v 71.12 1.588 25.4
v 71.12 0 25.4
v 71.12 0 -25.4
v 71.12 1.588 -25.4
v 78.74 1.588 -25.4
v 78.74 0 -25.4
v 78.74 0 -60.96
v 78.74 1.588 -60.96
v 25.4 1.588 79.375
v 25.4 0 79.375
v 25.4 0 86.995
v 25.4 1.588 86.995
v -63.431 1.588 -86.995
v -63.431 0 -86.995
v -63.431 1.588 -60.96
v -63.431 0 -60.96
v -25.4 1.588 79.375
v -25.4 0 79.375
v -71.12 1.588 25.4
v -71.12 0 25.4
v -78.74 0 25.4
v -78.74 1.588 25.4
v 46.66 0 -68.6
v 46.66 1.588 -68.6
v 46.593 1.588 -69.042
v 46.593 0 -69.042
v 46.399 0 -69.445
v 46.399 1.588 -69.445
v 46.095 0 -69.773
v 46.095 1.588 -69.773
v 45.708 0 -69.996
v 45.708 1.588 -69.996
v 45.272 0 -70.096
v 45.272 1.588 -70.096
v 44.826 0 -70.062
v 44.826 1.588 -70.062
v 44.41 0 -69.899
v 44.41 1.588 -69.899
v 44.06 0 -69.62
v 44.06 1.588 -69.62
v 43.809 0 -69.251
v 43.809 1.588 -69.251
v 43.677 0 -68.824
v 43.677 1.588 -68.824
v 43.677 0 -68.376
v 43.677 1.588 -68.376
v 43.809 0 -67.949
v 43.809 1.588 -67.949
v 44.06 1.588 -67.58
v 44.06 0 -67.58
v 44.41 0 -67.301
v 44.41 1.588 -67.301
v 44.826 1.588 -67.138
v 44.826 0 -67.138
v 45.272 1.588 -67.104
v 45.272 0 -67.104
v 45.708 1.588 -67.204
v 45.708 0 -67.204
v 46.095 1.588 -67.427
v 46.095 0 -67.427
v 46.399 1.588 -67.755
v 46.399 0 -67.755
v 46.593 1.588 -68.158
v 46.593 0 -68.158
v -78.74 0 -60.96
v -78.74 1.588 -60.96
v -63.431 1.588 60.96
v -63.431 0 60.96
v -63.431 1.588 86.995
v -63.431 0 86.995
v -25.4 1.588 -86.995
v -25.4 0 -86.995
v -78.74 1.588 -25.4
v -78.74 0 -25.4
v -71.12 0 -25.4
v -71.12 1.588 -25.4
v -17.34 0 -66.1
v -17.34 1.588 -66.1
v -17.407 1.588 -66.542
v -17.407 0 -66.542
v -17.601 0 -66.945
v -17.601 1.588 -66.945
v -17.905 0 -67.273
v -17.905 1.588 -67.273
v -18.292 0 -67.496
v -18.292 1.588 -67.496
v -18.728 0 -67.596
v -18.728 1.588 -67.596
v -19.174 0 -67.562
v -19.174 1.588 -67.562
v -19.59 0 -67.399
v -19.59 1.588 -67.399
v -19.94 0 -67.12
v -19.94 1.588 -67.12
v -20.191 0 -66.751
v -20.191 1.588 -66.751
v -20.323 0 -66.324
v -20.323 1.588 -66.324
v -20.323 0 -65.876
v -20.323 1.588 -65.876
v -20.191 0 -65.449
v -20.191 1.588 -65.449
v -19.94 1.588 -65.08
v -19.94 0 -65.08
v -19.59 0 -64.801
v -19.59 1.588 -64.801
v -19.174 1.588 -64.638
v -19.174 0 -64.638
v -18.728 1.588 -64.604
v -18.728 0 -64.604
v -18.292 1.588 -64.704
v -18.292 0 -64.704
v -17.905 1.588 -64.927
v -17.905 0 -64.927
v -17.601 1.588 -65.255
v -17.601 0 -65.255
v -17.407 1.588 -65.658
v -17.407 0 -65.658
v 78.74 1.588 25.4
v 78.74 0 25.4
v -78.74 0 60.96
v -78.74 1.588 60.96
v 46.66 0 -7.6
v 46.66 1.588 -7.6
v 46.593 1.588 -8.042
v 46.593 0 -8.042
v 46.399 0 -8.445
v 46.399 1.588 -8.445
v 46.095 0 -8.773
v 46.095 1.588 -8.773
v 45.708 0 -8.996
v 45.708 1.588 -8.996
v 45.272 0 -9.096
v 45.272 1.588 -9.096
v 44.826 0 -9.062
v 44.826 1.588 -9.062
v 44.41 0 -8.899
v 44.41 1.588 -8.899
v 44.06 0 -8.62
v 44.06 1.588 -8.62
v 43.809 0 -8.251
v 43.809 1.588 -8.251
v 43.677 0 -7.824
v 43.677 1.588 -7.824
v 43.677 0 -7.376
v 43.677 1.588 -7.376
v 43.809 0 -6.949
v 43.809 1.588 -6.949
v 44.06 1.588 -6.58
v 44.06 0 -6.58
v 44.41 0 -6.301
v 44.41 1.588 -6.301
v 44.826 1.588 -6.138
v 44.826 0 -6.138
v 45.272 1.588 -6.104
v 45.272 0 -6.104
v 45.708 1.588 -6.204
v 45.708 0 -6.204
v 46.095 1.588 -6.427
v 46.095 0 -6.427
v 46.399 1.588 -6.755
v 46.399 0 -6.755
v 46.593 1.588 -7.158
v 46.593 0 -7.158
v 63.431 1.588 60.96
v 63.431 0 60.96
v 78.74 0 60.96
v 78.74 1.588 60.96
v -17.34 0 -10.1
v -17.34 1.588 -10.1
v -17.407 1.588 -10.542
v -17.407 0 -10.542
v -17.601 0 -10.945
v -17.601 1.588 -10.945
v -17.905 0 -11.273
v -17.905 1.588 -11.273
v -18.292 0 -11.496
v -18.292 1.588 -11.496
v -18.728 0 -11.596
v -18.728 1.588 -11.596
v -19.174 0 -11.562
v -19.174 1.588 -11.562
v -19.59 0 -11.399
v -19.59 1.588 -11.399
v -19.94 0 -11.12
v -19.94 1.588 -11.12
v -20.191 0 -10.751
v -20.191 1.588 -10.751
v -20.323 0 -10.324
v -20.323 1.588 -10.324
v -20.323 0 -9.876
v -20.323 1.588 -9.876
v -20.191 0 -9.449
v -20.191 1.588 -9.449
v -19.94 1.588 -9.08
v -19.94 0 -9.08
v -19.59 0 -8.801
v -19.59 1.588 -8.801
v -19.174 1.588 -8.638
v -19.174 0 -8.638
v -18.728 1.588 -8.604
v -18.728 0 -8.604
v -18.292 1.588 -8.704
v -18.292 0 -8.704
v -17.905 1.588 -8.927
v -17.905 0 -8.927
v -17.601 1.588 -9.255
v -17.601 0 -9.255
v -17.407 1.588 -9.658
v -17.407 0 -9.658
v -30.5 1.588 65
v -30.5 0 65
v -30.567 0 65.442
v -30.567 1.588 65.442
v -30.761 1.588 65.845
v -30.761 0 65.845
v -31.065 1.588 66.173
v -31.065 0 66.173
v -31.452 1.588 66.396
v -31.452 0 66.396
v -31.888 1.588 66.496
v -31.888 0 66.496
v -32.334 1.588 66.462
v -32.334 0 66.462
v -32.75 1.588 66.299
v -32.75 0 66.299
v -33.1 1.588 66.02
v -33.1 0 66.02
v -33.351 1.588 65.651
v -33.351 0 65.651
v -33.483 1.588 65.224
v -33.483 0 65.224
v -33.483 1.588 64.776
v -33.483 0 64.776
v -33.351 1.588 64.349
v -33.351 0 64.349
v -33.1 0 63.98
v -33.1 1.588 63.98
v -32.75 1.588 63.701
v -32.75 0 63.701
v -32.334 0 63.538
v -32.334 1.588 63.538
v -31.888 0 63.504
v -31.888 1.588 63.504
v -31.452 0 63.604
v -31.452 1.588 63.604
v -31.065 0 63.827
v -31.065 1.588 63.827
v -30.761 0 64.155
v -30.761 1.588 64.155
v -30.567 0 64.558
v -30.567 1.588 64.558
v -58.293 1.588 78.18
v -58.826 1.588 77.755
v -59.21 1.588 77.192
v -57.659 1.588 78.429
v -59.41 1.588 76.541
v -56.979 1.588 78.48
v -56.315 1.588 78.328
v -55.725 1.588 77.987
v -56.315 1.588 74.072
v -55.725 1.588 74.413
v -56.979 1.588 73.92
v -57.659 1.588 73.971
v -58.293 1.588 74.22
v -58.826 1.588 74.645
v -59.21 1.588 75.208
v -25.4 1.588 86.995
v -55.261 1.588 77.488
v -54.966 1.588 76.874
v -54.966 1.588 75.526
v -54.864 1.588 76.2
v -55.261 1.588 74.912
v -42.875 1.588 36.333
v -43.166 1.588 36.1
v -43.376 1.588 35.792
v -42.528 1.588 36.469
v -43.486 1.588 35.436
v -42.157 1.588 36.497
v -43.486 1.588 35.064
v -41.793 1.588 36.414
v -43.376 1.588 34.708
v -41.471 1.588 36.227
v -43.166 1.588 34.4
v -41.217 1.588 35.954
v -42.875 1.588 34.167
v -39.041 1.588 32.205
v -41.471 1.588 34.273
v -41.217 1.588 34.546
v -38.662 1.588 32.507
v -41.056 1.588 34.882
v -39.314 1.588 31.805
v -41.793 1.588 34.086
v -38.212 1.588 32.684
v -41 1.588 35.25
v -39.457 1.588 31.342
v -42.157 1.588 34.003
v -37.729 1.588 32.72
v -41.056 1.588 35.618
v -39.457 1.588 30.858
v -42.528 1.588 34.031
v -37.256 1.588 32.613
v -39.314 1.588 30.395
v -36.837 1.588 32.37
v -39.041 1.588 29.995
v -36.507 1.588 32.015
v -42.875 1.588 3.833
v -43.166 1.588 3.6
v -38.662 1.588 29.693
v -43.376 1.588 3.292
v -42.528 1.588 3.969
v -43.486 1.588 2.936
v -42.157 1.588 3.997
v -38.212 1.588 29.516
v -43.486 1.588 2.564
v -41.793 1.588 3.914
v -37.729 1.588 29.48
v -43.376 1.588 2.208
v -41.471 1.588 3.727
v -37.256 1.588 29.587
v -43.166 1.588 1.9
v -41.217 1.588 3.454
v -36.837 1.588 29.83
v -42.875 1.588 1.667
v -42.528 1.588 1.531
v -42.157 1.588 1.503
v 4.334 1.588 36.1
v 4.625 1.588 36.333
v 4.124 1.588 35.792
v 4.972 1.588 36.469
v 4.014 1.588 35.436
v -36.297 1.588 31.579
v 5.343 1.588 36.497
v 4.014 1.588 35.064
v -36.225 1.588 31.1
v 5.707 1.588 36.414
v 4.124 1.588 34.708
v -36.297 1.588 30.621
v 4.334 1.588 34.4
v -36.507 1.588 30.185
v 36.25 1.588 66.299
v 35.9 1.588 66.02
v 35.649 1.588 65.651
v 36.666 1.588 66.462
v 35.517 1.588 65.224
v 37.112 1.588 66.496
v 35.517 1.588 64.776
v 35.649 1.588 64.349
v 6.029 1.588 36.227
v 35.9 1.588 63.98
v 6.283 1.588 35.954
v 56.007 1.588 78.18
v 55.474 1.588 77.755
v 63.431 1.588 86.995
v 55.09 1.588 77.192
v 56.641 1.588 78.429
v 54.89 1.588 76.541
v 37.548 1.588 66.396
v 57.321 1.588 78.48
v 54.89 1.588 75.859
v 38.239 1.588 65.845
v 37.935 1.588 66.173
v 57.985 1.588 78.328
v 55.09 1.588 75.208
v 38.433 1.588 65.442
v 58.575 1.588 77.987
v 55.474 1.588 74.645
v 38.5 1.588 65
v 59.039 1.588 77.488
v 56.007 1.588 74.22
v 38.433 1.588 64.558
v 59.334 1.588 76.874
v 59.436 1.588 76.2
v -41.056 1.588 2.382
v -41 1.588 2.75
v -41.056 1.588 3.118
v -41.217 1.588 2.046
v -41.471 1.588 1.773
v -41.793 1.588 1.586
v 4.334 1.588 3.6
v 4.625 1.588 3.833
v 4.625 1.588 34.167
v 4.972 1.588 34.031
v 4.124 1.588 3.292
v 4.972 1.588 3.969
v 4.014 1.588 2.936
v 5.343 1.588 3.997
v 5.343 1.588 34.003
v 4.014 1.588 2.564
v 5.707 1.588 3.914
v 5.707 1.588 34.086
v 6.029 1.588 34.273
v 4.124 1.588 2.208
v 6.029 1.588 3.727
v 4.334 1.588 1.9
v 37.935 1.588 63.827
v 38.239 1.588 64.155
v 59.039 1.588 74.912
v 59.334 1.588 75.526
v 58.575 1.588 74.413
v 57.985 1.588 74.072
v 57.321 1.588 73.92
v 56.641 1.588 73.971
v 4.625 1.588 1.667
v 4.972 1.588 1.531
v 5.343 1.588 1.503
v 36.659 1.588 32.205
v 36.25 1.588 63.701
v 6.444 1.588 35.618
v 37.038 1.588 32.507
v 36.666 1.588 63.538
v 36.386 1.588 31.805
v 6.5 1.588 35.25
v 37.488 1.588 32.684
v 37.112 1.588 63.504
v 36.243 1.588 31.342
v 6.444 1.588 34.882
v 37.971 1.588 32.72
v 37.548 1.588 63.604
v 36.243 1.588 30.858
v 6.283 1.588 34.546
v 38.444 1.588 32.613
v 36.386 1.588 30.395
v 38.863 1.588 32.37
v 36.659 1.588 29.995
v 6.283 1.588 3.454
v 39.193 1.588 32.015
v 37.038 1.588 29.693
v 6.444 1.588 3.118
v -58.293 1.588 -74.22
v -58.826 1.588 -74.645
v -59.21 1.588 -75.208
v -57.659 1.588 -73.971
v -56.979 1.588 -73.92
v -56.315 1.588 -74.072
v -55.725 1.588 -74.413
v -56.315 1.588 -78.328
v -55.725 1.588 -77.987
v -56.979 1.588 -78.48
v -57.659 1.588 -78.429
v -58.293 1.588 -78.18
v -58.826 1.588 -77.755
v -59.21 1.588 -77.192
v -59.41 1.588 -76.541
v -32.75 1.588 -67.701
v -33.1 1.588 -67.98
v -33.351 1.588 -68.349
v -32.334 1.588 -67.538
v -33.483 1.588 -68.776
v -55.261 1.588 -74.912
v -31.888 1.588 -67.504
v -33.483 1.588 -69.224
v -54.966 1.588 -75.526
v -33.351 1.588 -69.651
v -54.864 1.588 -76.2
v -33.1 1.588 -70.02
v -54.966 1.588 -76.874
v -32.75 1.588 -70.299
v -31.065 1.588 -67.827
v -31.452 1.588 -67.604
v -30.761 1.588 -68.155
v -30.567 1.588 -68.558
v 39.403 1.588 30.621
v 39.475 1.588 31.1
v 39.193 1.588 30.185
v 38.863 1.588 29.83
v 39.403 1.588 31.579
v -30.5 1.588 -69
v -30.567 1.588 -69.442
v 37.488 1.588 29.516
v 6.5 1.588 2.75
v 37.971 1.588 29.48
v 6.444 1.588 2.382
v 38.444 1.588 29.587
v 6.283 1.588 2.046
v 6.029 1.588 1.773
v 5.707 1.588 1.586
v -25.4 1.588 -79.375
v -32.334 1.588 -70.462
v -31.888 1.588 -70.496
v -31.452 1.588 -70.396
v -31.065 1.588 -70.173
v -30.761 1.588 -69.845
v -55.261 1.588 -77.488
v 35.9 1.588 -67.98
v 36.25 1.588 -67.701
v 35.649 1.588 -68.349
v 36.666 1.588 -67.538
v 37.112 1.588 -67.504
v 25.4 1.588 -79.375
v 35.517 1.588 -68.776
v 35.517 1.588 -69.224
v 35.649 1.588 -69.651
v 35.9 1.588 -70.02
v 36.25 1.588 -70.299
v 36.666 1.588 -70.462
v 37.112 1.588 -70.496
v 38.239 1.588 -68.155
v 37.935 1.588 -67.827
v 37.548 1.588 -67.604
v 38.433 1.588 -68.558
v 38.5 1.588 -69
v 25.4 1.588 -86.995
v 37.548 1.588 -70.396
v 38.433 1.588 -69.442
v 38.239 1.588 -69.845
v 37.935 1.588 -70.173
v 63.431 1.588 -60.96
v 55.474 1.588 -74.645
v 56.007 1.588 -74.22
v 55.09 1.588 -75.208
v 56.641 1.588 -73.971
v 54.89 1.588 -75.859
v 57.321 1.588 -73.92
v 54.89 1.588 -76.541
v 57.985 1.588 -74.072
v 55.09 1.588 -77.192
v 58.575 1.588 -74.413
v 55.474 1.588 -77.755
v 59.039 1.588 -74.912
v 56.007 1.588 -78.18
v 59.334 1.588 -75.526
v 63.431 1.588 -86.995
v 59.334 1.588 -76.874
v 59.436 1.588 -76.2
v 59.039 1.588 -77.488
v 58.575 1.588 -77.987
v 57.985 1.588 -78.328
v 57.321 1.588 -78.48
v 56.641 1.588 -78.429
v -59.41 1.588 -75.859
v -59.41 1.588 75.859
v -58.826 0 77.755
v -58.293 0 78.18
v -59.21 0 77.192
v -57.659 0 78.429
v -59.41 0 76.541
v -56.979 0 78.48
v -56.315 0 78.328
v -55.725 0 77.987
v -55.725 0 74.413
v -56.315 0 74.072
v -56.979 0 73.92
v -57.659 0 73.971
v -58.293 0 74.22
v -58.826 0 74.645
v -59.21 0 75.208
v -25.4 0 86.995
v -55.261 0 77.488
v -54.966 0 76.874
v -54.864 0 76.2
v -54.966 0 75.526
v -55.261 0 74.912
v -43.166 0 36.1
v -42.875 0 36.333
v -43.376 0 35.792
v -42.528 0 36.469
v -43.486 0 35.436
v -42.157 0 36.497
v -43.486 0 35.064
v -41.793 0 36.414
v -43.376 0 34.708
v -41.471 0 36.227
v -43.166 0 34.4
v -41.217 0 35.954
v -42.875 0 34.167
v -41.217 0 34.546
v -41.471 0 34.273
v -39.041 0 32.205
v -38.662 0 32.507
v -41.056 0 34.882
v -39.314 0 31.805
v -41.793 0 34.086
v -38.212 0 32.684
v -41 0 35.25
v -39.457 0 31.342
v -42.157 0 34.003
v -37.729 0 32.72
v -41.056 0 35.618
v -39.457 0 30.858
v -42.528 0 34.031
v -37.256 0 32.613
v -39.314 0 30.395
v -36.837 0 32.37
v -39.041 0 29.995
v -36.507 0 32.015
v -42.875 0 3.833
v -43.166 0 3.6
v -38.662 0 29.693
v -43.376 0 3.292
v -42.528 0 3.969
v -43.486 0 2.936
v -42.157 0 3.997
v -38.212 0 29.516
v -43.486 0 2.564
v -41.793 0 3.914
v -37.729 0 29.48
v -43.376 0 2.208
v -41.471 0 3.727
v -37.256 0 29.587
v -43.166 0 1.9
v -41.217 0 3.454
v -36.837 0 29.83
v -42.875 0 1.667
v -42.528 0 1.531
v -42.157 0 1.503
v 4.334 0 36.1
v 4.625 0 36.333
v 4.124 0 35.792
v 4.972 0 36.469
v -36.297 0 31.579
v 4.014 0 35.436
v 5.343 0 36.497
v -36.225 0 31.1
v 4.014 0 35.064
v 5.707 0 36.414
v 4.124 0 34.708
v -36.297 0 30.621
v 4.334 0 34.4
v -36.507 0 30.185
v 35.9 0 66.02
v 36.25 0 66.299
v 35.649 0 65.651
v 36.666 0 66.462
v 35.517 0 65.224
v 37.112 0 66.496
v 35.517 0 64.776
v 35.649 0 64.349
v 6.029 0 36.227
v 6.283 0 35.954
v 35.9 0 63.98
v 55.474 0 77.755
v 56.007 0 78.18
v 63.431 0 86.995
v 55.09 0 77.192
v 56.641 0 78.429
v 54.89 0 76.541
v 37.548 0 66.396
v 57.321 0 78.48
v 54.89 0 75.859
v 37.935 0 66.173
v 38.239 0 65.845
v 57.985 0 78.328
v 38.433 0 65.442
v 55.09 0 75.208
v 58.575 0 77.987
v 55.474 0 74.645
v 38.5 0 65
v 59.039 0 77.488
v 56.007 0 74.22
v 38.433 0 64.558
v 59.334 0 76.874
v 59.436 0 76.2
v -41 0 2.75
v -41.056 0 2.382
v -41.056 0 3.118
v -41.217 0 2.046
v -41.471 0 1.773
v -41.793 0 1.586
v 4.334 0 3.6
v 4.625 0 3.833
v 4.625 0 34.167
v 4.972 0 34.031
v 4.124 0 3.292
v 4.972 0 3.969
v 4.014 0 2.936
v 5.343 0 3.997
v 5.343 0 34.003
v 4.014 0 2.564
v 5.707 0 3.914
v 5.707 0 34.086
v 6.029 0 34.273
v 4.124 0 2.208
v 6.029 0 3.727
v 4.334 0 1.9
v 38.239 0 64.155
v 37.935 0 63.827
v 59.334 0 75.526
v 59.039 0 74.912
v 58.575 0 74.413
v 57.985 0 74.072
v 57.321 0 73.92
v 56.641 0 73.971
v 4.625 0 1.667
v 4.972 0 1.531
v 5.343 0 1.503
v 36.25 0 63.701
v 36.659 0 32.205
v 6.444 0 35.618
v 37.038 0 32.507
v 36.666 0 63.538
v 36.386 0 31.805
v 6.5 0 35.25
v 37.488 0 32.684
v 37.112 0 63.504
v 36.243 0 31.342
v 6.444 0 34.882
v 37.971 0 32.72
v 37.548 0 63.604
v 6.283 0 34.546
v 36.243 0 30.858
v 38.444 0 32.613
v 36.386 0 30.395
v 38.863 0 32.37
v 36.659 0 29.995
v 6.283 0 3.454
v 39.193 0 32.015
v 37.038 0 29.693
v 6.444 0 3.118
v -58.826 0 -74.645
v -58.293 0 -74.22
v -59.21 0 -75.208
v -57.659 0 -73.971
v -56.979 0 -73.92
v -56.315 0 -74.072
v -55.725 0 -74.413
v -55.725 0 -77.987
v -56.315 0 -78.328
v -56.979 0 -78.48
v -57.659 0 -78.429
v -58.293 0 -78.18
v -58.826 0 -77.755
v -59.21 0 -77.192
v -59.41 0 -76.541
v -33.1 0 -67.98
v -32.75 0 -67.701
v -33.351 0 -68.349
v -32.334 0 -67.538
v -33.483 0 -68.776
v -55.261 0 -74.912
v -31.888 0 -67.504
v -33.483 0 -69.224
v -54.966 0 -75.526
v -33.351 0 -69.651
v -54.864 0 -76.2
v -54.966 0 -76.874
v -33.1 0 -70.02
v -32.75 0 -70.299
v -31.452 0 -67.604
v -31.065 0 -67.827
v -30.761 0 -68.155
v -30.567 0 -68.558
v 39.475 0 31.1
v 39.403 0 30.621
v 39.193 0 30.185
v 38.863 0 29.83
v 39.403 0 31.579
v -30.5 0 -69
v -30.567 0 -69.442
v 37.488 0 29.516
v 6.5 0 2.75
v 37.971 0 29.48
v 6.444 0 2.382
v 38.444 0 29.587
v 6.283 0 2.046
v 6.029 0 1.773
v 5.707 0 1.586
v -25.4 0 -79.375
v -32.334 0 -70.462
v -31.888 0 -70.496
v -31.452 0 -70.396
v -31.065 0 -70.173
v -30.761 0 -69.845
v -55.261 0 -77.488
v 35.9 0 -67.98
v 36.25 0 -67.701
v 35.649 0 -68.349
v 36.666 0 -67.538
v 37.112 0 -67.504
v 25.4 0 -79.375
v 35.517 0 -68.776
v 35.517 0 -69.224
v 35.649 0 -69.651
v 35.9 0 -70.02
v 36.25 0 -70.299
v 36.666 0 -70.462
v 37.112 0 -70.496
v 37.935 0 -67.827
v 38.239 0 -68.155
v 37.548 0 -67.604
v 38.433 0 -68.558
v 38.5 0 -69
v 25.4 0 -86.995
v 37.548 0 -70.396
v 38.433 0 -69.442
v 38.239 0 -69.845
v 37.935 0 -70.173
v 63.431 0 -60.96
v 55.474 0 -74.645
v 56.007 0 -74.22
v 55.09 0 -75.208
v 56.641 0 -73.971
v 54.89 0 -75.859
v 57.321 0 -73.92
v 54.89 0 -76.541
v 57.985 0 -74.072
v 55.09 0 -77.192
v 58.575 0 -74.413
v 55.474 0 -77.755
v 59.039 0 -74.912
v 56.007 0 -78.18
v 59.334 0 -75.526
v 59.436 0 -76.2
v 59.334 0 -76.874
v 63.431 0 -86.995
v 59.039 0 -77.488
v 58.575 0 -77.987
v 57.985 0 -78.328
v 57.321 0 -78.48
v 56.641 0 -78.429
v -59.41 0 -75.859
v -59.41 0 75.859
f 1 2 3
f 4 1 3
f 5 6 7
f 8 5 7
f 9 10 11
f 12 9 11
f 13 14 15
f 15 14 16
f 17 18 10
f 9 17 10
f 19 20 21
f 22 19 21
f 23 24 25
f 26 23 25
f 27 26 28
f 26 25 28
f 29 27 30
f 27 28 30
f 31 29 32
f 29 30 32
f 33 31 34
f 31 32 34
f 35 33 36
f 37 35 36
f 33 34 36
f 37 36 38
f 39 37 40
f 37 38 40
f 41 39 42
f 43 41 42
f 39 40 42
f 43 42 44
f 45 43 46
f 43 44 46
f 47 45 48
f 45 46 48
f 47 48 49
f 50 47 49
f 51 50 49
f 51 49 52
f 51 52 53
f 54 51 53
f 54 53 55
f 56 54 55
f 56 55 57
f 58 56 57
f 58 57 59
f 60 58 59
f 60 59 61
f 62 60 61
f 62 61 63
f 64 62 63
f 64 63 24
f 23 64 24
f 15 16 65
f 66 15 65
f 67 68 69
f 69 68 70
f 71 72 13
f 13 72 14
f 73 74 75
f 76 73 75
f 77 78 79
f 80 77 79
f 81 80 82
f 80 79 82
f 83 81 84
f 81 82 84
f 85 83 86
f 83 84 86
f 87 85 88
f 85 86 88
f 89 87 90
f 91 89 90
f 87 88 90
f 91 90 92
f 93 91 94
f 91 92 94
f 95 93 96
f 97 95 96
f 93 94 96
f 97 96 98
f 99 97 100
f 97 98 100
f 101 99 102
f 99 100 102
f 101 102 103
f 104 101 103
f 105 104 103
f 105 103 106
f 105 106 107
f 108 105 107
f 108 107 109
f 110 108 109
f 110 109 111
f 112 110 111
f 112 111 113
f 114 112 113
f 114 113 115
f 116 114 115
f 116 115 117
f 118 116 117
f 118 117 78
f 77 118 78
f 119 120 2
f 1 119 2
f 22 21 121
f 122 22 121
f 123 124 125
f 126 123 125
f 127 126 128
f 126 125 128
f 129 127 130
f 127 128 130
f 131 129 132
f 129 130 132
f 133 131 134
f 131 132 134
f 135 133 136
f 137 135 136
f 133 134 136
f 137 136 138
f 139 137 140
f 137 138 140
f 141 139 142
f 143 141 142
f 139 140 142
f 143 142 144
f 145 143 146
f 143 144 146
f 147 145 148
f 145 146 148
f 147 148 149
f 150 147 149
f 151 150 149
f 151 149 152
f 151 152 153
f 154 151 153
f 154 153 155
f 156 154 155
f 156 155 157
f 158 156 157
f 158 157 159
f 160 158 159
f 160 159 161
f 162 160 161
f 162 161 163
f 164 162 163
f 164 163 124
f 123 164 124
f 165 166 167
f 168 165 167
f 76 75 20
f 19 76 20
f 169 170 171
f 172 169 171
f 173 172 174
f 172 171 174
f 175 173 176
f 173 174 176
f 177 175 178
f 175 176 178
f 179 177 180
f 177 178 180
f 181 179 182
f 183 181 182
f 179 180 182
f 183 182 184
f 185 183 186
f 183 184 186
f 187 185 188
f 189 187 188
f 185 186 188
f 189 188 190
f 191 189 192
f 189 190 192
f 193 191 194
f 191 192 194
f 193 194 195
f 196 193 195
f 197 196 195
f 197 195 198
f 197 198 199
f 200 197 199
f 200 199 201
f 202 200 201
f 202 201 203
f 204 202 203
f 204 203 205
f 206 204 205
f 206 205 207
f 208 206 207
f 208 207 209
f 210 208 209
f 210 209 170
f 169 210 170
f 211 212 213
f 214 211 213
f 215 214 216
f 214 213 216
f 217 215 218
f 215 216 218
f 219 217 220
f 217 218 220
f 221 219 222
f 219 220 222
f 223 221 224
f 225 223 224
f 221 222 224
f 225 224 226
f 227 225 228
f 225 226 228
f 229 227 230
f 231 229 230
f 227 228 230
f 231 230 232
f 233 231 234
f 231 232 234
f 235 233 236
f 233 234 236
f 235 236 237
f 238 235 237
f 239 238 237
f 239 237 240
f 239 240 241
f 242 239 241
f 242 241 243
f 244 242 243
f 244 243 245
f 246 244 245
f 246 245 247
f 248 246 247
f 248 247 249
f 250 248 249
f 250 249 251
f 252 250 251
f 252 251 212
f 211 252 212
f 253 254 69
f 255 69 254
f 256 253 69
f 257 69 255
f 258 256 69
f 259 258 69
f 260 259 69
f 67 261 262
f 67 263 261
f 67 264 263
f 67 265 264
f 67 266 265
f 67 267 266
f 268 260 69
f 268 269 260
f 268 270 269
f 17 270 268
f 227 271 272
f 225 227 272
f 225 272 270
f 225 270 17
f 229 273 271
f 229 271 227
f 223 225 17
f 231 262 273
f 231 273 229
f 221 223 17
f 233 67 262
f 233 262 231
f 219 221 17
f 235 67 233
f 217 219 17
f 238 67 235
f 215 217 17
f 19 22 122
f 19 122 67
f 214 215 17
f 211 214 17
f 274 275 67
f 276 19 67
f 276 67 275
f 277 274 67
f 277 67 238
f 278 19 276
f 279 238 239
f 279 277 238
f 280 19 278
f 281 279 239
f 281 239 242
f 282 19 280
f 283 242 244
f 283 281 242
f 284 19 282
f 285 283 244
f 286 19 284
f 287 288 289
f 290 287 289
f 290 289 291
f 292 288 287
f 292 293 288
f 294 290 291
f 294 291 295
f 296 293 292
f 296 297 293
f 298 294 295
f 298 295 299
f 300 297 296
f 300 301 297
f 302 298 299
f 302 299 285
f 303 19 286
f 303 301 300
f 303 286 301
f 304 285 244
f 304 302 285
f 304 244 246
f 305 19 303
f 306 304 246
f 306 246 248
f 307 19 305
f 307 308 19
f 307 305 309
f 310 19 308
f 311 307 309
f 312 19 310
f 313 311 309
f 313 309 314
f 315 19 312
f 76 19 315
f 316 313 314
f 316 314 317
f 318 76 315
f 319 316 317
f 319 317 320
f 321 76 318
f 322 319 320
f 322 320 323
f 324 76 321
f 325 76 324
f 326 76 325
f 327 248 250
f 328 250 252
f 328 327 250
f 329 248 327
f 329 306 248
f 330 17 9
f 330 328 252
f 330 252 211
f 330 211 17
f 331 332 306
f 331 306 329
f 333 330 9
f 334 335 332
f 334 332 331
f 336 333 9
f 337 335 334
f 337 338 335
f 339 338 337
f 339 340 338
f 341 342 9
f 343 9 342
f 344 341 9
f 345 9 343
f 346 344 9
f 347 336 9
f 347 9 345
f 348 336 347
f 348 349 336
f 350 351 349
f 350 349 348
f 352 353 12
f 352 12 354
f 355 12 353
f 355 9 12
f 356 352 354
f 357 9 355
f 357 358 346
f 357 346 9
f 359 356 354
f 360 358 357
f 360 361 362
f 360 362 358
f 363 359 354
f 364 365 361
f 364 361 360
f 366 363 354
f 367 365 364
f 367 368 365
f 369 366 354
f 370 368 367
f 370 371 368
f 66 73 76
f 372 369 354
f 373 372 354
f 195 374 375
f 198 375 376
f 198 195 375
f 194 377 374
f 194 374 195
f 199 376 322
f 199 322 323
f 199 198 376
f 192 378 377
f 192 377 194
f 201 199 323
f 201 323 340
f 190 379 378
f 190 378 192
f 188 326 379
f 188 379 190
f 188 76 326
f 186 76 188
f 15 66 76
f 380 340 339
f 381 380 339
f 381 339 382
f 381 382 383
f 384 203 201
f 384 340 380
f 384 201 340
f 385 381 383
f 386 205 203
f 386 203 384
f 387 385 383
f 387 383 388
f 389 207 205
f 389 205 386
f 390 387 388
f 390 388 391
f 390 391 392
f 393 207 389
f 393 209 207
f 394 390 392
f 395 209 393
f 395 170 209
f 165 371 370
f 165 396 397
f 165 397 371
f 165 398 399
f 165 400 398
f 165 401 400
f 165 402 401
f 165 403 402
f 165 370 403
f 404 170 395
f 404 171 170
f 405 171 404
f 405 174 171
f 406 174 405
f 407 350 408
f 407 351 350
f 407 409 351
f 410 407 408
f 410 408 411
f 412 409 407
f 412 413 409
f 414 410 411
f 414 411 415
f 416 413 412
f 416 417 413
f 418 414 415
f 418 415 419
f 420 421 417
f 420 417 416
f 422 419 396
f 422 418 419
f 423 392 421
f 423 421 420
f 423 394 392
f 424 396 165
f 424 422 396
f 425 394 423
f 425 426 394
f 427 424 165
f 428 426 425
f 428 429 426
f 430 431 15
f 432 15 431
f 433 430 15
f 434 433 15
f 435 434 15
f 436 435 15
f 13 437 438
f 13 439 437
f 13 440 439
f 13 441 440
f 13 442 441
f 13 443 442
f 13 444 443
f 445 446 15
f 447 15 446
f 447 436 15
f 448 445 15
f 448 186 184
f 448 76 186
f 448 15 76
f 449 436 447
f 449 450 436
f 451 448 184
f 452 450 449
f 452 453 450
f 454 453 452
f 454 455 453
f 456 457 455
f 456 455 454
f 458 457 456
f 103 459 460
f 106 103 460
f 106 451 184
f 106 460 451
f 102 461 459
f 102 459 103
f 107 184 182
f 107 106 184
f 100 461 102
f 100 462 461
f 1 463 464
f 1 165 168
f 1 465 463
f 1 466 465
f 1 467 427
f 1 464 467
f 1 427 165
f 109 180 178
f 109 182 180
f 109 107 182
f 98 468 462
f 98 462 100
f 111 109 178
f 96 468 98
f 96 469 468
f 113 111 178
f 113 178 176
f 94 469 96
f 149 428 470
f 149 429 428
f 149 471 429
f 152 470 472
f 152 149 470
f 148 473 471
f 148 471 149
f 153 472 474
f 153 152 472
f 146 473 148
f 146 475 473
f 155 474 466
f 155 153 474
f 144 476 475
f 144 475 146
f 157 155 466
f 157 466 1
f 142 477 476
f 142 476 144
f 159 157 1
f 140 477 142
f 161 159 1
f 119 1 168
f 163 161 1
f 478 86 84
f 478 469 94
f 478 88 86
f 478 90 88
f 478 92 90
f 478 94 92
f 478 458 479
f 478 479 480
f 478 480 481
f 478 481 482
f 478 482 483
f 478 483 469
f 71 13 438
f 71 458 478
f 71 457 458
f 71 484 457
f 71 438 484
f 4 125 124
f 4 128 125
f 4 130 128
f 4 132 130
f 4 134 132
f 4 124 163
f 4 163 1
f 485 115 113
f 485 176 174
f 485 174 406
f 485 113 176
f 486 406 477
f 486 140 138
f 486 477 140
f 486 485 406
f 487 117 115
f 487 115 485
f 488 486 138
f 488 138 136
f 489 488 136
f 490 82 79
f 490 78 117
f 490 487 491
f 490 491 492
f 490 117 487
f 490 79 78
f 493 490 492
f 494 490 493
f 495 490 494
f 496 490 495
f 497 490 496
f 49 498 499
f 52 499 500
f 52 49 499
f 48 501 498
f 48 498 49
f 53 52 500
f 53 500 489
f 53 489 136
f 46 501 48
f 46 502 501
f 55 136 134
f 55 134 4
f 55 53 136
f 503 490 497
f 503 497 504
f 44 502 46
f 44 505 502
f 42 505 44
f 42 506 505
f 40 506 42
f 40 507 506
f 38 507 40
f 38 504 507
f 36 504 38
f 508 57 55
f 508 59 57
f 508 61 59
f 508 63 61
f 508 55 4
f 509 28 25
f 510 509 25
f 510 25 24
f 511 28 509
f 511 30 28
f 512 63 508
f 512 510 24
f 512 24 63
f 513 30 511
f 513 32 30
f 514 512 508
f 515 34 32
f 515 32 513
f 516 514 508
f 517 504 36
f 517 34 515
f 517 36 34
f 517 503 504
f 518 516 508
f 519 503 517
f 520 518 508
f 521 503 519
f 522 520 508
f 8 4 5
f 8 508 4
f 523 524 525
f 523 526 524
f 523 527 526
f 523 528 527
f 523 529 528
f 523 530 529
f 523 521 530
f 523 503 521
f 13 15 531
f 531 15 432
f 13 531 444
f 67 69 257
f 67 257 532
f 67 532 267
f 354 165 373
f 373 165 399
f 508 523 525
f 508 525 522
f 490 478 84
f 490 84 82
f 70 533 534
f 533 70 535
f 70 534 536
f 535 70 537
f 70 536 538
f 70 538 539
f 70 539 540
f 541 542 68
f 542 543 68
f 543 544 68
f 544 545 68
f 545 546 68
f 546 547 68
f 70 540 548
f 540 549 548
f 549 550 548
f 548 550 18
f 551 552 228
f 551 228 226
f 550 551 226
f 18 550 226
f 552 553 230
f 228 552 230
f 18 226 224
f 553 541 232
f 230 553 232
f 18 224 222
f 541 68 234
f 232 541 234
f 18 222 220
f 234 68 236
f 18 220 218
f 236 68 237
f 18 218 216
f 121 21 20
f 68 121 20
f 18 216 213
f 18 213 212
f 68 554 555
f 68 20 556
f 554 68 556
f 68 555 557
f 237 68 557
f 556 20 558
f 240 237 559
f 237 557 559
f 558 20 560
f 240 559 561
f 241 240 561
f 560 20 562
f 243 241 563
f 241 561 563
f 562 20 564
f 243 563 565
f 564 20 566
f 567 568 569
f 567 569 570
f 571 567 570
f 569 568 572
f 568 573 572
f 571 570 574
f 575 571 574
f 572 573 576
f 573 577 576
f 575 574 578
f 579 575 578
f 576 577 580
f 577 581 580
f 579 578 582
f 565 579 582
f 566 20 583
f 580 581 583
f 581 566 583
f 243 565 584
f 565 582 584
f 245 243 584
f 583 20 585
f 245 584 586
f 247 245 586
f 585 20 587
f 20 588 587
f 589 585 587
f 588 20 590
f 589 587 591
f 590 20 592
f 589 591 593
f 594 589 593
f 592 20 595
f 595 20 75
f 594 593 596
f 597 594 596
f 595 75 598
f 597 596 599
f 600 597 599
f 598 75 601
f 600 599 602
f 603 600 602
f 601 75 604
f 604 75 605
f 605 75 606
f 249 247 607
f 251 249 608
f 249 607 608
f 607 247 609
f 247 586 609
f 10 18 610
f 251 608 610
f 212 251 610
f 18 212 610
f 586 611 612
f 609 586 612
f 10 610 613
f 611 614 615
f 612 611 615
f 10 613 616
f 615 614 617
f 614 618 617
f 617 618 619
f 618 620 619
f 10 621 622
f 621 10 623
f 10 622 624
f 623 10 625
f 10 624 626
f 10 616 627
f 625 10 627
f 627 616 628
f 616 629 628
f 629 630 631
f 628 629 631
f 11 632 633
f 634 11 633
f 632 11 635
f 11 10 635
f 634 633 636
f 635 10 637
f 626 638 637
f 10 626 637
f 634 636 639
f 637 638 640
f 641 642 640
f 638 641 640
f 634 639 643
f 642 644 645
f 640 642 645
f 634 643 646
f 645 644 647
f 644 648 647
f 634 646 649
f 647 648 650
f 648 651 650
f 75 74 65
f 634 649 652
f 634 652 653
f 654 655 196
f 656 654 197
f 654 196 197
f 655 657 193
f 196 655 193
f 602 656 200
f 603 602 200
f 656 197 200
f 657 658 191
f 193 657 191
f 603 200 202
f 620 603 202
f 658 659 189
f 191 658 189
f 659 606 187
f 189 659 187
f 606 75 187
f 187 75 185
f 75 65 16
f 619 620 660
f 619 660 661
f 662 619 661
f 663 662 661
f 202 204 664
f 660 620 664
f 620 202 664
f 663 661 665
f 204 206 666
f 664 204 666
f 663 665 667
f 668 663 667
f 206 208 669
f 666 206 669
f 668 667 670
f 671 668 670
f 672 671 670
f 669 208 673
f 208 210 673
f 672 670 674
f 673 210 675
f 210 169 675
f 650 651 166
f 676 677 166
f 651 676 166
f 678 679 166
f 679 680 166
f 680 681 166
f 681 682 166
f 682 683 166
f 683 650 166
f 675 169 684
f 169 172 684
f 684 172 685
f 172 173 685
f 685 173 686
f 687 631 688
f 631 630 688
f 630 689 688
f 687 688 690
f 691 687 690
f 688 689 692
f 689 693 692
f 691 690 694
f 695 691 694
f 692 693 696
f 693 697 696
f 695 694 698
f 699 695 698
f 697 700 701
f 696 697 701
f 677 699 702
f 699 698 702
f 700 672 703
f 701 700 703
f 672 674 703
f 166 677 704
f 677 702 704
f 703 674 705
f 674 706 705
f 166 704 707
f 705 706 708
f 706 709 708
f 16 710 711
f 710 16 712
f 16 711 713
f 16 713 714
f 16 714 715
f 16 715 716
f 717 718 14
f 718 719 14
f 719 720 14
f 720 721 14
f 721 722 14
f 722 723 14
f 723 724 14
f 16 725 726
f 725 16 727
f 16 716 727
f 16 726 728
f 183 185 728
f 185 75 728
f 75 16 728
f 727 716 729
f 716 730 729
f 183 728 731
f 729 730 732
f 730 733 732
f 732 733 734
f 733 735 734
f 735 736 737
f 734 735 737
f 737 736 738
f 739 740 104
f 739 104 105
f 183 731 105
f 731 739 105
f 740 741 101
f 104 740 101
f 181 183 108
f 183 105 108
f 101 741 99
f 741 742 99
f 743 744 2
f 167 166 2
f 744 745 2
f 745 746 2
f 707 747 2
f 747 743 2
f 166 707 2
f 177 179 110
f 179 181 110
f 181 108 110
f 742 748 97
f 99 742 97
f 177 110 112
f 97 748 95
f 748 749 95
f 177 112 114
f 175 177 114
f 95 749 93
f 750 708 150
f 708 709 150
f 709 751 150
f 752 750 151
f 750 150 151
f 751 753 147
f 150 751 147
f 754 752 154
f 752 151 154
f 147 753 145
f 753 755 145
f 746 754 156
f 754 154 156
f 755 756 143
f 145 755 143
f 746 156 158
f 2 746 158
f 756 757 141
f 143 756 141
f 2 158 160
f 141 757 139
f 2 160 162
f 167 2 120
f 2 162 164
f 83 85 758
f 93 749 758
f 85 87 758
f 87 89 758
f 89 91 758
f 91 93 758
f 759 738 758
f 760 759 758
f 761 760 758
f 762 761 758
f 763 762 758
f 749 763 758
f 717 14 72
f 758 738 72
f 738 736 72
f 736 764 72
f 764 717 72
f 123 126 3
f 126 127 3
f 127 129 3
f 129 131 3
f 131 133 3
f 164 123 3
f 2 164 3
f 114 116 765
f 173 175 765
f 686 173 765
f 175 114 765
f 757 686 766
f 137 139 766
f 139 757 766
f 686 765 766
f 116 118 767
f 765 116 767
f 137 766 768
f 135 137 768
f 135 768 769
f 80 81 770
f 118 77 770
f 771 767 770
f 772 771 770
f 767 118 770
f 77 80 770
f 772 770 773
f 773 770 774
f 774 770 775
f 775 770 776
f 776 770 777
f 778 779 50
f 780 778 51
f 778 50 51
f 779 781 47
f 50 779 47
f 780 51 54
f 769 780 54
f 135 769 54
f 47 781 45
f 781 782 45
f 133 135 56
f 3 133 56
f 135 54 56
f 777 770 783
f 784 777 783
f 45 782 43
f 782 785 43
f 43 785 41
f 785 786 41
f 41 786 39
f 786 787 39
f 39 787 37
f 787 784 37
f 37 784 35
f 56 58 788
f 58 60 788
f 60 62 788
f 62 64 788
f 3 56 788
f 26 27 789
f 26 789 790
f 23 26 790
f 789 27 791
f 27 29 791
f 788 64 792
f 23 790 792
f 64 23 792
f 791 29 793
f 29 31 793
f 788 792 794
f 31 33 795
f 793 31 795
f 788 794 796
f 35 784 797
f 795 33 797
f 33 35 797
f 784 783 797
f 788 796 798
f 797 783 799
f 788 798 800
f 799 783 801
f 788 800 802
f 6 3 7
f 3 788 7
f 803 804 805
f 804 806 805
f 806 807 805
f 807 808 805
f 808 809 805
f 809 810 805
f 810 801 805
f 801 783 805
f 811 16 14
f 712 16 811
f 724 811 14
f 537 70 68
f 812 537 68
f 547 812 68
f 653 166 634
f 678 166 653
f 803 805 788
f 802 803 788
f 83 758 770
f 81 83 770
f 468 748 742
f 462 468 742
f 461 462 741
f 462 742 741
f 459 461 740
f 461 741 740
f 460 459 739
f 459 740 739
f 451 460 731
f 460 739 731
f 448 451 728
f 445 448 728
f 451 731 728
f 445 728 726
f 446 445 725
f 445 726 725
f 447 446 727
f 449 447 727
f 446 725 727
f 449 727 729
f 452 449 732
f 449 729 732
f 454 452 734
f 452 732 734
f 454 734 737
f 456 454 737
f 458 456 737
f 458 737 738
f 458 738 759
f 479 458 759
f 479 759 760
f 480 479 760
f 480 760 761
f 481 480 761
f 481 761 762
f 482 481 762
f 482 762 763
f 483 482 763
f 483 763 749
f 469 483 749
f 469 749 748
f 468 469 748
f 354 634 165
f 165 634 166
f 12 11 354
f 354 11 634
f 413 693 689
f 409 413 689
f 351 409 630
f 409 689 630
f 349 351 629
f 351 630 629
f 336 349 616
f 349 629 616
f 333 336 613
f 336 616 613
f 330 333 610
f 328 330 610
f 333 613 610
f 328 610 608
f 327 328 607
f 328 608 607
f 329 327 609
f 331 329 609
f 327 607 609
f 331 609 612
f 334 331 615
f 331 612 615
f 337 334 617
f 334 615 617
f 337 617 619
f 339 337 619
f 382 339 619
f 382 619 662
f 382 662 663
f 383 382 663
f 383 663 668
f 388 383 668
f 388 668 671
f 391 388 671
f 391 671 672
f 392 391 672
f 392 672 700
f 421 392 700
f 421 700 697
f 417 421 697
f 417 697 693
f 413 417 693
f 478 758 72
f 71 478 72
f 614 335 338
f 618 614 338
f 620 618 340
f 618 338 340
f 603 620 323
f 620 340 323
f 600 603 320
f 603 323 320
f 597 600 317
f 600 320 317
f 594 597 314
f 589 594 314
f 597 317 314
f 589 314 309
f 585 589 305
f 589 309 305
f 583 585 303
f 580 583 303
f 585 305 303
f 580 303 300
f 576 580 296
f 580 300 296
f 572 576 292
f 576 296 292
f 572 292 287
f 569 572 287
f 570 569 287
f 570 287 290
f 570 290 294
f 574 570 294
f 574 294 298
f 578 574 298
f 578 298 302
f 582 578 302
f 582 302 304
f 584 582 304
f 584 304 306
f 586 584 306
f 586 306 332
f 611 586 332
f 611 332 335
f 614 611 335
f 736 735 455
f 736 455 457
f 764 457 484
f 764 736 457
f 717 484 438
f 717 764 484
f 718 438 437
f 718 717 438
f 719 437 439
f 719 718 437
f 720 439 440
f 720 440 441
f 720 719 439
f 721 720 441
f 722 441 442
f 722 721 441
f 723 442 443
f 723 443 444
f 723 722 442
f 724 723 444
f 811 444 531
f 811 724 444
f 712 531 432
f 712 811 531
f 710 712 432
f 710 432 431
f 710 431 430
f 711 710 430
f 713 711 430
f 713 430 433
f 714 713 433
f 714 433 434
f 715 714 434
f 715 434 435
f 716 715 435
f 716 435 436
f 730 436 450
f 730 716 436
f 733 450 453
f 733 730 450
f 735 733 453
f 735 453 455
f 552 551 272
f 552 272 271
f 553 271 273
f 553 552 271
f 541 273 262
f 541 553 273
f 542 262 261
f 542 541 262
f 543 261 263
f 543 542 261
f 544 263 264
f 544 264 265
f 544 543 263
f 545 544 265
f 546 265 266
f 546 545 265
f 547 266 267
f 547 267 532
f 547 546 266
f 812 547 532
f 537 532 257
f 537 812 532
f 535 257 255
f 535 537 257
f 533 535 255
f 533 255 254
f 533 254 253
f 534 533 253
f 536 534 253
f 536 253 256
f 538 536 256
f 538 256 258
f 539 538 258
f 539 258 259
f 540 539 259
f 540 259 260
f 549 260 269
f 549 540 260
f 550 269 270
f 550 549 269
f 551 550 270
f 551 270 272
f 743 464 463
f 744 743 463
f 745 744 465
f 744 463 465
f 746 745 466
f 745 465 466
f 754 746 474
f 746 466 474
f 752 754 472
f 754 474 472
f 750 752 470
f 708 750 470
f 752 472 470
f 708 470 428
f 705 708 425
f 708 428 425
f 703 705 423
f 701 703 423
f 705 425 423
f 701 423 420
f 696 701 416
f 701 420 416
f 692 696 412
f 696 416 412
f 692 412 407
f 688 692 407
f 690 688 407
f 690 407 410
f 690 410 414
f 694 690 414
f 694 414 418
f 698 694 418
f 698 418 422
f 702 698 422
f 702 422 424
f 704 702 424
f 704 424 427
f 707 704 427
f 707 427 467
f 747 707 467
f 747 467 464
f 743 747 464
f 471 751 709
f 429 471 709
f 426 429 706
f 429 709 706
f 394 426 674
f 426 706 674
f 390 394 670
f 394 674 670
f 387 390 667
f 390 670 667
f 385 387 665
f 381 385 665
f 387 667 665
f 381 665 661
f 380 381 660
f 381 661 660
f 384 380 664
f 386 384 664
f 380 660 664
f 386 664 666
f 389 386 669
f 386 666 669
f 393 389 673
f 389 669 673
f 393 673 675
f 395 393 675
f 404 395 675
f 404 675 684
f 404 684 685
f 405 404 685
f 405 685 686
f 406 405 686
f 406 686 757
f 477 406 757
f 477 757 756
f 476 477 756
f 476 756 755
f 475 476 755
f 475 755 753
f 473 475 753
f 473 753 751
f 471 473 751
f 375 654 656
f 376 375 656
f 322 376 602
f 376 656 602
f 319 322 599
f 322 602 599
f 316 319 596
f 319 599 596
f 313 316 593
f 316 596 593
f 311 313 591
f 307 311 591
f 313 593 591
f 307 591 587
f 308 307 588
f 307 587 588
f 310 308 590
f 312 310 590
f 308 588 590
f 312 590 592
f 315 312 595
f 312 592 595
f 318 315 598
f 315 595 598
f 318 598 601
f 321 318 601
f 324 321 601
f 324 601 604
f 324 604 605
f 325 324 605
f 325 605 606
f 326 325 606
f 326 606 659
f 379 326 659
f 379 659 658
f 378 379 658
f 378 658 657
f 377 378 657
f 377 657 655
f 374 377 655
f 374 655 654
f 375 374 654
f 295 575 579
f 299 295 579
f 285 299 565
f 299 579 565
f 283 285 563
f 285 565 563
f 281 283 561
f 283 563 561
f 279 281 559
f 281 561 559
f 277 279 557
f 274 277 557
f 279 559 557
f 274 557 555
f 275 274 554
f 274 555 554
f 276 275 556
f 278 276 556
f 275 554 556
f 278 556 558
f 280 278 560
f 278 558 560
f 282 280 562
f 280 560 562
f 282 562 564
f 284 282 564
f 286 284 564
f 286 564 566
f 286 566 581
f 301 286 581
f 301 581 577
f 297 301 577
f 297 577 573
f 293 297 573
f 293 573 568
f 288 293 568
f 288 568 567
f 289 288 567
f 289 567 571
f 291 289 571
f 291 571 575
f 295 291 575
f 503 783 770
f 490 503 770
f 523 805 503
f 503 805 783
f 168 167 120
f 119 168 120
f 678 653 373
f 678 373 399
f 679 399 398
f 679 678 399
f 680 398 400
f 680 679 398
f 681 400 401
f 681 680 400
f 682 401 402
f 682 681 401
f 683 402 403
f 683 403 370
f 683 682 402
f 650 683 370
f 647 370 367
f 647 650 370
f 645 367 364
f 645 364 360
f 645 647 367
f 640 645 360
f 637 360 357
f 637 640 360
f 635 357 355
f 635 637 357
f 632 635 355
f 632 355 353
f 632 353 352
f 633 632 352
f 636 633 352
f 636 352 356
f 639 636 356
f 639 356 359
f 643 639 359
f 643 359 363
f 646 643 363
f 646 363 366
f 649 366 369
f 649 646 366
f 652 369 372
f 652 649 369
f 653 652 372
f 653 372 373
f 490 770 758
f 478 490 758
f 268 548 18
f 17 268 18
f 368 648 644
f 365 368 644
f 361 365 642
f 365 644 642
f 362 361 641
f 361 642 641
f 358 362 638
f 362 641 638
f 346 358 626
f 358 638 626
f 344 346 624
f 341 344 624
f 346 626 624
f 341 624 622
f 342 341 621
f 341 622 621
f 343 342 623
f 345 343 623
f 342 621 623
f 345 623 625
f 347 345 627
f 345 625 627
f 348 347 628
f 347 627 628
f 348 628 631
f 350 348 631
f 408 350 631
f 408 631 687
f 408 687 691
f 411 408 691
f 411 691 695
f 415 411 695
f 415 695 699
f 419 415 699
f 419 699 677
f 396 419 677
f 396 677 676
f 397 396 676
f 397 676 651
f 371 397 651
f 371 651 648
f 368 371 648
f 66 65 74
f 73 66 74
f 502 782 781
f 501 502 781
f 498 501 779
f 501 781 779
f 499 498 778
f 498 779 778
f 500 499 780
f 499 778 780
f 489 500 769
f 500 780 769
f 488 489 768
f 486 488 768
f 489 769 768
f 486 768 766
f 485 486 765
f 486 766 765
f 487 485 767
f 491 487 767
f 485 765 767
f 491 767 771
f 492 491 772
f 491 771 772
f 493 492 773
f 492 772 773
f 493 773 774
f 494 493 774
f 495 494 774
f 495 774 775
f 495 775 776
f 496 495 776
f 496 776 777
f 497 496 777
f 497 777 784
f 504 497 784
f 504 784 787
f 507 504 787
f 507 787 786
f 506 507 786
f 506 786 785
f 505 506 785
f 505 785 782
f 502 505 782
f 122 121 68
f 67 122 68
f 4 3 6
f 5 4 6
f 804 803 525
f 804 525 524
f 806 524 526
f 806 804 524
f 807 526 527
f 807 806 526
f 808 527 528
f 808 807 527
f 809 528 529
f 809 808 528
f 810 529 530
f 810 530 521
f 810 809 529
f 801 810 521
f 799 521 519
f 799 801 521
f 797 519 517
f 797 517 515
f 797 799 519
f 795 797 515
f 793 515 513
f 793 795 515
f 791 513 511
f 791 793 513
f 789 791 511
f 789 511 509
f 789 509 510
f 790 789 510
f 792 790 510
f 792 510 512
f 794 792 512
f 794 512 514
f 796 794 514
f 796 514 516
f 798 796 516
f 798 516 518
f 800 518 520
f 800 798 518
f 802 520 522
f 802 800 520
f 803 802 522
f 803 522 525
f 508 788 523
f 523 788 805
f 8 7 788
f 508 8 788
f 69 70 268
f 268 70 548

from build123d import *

# Parameters (mm, degrees)
SKETCH1_R          = 2.286
MAIN_BODY_DEPTH    = 1.5875
CUT_EXTRUDE3_REACH = 3.587
SKETCH12_R         = 1.5
SKETCH12_R_2       = 1.25
CUT_EXTRUDE4_REACH = 3.587
SKETCH13_R         = 1.5
SKETCH13_R_2       = 1.625


with BuildPart() as part:
    # Sketch1 → Main Body (new body)
    with BuildSketch(Plane(origin=(0, 0, 0), x_dir=(1, 0, 0), z_dir=(0, 1, 0))):
        Polygon((-25.4, 86.995), (-63.43142, 86.995), (-63.43142, 60.96), (-78.74, 60.96), (-78.74, 25.4), (-71.12, 25.4), (-71.12, -25.4), (-78.74, -25.4), (-78.74, -60.96), (-63.43142, -60.96), (-63.43142, -86.995), (-25.4, -86.995), (-25.4, -79.375), (25.4, -79.375), (25.4, -86.995), (63.43142, -86.995), (63.43142, -60.96), (78.74, -60.96), (78.74, -25.4), (71.12, -25.4), (71.12, 25.4), (78.74, 25.4), (78.74, 60.96), (63.43142, 60.96), (63.43142, 86.995), (25.4, 86.995), (25.4, 79.375), (-25.4, 79.375), align=None)
        with Locations((-57.15, 76.2)):
            Circle(SKETCH1_R, mode=Mode.SUBTRACT)
        with Locations((57.15, 76.2)):
            Circle(SKETCH1_R, mode=Mode.SUBTRACT)
        with Locations((57.15, -76.2)):
            Circle(SKETCH1_R, mode=Mode.SUBTRACT)
        with Locations((-57.15, -76.2)):
            Circle(SKETCH1_R, mode=Mode.SUBTRACT)
    extrude(amount=MAIN_BODY_DEPTH)

    # Sketch12 → Cut-Extrude3 (cut, up to next)
    with BuildSketch(Plane.XZ, mode=Mode.PRIVATE) as cut_extrude3_sk1:
        with Locations((-32, -69)):
            Circle(SKETCH12_R)
    cut_extrude3_tool1 = extrude(cut_extrude3_sk1.sketch, amount=-CUT_EXTRUDE3_REACH, mode=Mode.PRIVATE) & part.part
    add(cut_extrude3_tool1.solids().sort_by_distance((-32, 0, -69))[0], mode=Mode.SUBTRACT)
    # Sketch12 → Cut-Extrude3 (cut, up to next)
    with BuildSketch(Plane.XZ, mode=Mode.PRIVATE) as cut_extrude3_sk2:
        with Locations((37, -69)):
            Circle(SKETCH12_R)
    cut_extrude3_tool2 = extrude(cut_extrude3_sk2.sketch, amount=-CUT_EXTRUDE3_REACH, mode=Mode.PRIVATE) & part.part
    add(cut_extrude3_tool2.solids().sort_by_distance((37, 0, -69))[0], mode=Mode.SUBTRACT)
    # Sketch12 → Cut-Extrude3 (cut, up to next)
    with BuildSketch(Plane.XZ, mode=Mode.PRIVATE) as cut_extrude3_sk3:
        with Locations((37, 65)):
            Circle(SKETCH12_R)
    cut_extrude3_tool3 = extrude(cut_extrude3_sk3.sketch, amount=-CUT_EXTRUDE3_REACH, mode=Mode.PRIVATE) & part.part
    add(cut_extrude3_tool3.solids().sort_by_distance((37, 0, 65))[0], mode=Mode.SUBTRACT)
    # Sketch12 → Cut-Extrude3 (cut, up to next)
    with BuildSketch(Plane.XZ, mode=Mode.PRIVATE) as cut_extrude3_sk4:
        with Locations((-32, 65)):
            Circle(SKETCH12_R)
    cut_extrude3_tool4 = extrude(cut_extrude3_sk4.sketch, amount=-CUT_EXTRUDE3_REACH, mode=Mode.PRIVATE) & part.part
    add(cut_extrude3_tool4.solids().sort_by_distance((-32, 0, 65))[0], mode=Mode.SUBTRACT)
    # Sketch12 → Cut-Extrude3 (cut, up to next)
    with BuildSketch(Plane.XZ, mode=Mode.PRIVATE) as cut_extrude3_sk5:
        with Locations((-42.25, 2.75)):
            Circle(SKETCH12_R_2)
    cut_extrude3_tool5 = extrude(cut_extrude3_sk5.sketch, amount=-CUT_EXTRUDE3_REACH, mode=Mode.PRIVATE) & part.part
    add(cut_extrude3_tool5.solids().sort_by_distance((-42.25, 0, 2.75))[0], mode=Mode.SUBTRACT)
    # Sketch12 → Cut-Extrude3 (cut, up to next)
    with BuildSketch(Plane.XZ, mode=Mode.PRIVATE) as cut_extrude3_sk6:
        with Locations((-42.25, 35.25)):
            Circle(SKETCH12_R_2)
    cut_extrude3_tool6 = extrude(cut_extrude3_sk6.sketch, amount=-CUT_EXTRUDE3_REACH, mode=Mode.PRIVATE) & part.part
    add(cut_extrude3_tool6.solids().sort_by_distance((-42.25, 0, 35.25))[0], mode=Mode.SUBTRACT)
    # Sketch12 → Cut-Extrude3 (cut, up to next)
    with BuildSketch(Plane.XZ, mode=Mode.PRIVATE) as cut_extrude3_sk7:
        with Locations((5.25, 2.75)):
            Circle(SKETCH12_R_2)
    cut_extrude3_tool7 = extrude(cut_extrude3_sk7.sketch, amount=-CUT_EXTRUDE3_REACH, mode=Mode.PRIVATE) & part.part
    add(cut_extrude3_tool7.solids().sort_by_distance((5.25, 0, 2.75))[0], mode=Mode.SUBTRACT)
    # Sketch12 → Cut-Extrude3 (cut, up to next)
    with BuildSketch(Plane.XZ, mode=Mode.PRIVATE) as cut_extrude3_sk8:
        with Locations((5.25, 35.25)):
            Circle(SKETCH12_R_2)
    cut_extrude3_tool8 = extrude(cut_extrude3_sk8.sketch, amount=-CUT_EXTRUDE3_REACH, mode=Mode.PRIVATE) & part.part
    add(cut_extrude3_tool8.solids().sort_by_distance((5.25, 0, 35.25))[0], mode=Mode.SUBTRACT)

    # Sketch13 → Cut-Extrude4 (cut, up to next)
    with BuildSketch(Plane(origin=(0, 1.5875, 0), x_dir=(1, 0, 0), z_dir=(0, 1, 0)), mode=Mode.PRIVATE) as cut_extrude4_sk1:
        with Locations((45.16, 7.6)):
            Circle(SKETCH13_R)
    cut_extrude4_tool1 = extrude(cut_extrude4_sk1.sketch, amount=-CUT_EXTRUDE4_REACH, mode=Mode.PRIVATE) & part.part
    add(cut_extrude4_tool1.solids().sort_by_distance((45.16, 1.5875, -7.6))[0], mode=Mode.SUBTRACT)
    # Sketch13 → Cut-Extrude4 (cut, up to next)
    with BuildSketch(Plane(origin=(0, 1.5875, 0), x_dir=(1, 0, 0), z_dir=(0, 1, 0)), mode=Mode.PRIVATE) as cut_extrude4_sk2:
        with Locations((45.16, 68.6)):
            Circle(SKETCH13_R)
    cut_extrude4_tool2 = extrude(cut_extrude4_sk2.sketch, amount=-CUT_EXTRUDE4_REACH, mode=Mode.PRIVATE) & part.part
    add(cut_extrude4_tool2.solids().sort_by_distance((45.16, 1.5875, -68.6))[0], mode=Mode.SUBTRACT)
    # Sketch13 → Cut-Extrude4 (cut, up to next)
    with BuildSketch(Plane(origin=(0, 1.5875, 0), x_dir=(1, 0, 0), z_dir=(0, 1, 0)), mode=Mode.PRIVATE) as cut_extrude4_sk3:
        with Locations((-18.84, 66.1)):
            Circle(SKETCH13_R)
    cut_extrude4_tool3 = extrude(cut_extrude4_sk3.sketch, amount=-CUT_EXTRUDE4_REACH, mode=Mode.PRIVATE) & part.part
    add(cut_extrude4_tool3.solids().sort_by_distance((-18.84, 1.5875, -66.1))[0], mode=Mode.SUBTRACT)
    # Sketch13 → Cut-Extrude4 (cut, up to next)
    with BuildSketch(Plane(origin=(0, 1.5875, 0), x_dir=(1, 0, 0), z_dir=(0, 1, 0)), mode=Mode.PRIVATE) as cut_extrude4_sk4:
        with Locations((-18.84, 10.1)):
            Circle(SKETCH13_R)
    cut_extrude4_tool4 = extrude(cut_extrude4_sk4.sketch, amount=-CUT_EXTRUDE4_REACH, mode=Mode.PRIVATE) & part.part
    add(cut_extrude4_tool4.solids().sort_by_distance((-18.84, 1.5875, -10.1))[0], mode=Mode.SUBTRACT)
    # Sketch13 → Cut-Extrude4 (cut, up to next)
    with BuildSketch(Plane(origin=(0, 1.5875, 0), x_dir=(1, 0, 0), z_dir=(0, 1, 0)), mode=Mode.PRIVATE) as cut_extrude4_sk5:
        with Locations((-37.85, -31.1)):
            Circle(SKETCH13_R_2)
    cut_extrude4_tool5 = extrude(cut_extrude4_sk5.sketch, amount=-CUT_EXTRUDE4_REACH, mode=Mode.PRIVATE) & part.part
    add(cut_extrude4_tool5.solids().sort_by_distance((-37.85, 1.5875, 31.1))[0], mode=Mode.SUBTRACT)
    # Sketch13 → Cut-Extrude4 (cut, up to next)
    with BuildSketch(Plane(origin=(0, 1.5875, 0), x_dir=(1, 0, 0), z_dir=(0, 1, 0)), mode=Mode.PRIVATE) as cut_extrude4_sk6:
        with Locations((37.85, -31.1)):
            Circle(SKETCH13_R_2)
    cut_extrude4_tool6 = extrude(cut_extrude4_sk6.sketch, amount=-CUT_EXTRUDE4_REACH, mode=Mode.PRIVATE) & part.part
    add(cut_extrude4_tool6.solids().sort_by_distance((37.85, 1.5875, 31.1))[0], mode=Mode.SUBTRACT)


solid = part.part
